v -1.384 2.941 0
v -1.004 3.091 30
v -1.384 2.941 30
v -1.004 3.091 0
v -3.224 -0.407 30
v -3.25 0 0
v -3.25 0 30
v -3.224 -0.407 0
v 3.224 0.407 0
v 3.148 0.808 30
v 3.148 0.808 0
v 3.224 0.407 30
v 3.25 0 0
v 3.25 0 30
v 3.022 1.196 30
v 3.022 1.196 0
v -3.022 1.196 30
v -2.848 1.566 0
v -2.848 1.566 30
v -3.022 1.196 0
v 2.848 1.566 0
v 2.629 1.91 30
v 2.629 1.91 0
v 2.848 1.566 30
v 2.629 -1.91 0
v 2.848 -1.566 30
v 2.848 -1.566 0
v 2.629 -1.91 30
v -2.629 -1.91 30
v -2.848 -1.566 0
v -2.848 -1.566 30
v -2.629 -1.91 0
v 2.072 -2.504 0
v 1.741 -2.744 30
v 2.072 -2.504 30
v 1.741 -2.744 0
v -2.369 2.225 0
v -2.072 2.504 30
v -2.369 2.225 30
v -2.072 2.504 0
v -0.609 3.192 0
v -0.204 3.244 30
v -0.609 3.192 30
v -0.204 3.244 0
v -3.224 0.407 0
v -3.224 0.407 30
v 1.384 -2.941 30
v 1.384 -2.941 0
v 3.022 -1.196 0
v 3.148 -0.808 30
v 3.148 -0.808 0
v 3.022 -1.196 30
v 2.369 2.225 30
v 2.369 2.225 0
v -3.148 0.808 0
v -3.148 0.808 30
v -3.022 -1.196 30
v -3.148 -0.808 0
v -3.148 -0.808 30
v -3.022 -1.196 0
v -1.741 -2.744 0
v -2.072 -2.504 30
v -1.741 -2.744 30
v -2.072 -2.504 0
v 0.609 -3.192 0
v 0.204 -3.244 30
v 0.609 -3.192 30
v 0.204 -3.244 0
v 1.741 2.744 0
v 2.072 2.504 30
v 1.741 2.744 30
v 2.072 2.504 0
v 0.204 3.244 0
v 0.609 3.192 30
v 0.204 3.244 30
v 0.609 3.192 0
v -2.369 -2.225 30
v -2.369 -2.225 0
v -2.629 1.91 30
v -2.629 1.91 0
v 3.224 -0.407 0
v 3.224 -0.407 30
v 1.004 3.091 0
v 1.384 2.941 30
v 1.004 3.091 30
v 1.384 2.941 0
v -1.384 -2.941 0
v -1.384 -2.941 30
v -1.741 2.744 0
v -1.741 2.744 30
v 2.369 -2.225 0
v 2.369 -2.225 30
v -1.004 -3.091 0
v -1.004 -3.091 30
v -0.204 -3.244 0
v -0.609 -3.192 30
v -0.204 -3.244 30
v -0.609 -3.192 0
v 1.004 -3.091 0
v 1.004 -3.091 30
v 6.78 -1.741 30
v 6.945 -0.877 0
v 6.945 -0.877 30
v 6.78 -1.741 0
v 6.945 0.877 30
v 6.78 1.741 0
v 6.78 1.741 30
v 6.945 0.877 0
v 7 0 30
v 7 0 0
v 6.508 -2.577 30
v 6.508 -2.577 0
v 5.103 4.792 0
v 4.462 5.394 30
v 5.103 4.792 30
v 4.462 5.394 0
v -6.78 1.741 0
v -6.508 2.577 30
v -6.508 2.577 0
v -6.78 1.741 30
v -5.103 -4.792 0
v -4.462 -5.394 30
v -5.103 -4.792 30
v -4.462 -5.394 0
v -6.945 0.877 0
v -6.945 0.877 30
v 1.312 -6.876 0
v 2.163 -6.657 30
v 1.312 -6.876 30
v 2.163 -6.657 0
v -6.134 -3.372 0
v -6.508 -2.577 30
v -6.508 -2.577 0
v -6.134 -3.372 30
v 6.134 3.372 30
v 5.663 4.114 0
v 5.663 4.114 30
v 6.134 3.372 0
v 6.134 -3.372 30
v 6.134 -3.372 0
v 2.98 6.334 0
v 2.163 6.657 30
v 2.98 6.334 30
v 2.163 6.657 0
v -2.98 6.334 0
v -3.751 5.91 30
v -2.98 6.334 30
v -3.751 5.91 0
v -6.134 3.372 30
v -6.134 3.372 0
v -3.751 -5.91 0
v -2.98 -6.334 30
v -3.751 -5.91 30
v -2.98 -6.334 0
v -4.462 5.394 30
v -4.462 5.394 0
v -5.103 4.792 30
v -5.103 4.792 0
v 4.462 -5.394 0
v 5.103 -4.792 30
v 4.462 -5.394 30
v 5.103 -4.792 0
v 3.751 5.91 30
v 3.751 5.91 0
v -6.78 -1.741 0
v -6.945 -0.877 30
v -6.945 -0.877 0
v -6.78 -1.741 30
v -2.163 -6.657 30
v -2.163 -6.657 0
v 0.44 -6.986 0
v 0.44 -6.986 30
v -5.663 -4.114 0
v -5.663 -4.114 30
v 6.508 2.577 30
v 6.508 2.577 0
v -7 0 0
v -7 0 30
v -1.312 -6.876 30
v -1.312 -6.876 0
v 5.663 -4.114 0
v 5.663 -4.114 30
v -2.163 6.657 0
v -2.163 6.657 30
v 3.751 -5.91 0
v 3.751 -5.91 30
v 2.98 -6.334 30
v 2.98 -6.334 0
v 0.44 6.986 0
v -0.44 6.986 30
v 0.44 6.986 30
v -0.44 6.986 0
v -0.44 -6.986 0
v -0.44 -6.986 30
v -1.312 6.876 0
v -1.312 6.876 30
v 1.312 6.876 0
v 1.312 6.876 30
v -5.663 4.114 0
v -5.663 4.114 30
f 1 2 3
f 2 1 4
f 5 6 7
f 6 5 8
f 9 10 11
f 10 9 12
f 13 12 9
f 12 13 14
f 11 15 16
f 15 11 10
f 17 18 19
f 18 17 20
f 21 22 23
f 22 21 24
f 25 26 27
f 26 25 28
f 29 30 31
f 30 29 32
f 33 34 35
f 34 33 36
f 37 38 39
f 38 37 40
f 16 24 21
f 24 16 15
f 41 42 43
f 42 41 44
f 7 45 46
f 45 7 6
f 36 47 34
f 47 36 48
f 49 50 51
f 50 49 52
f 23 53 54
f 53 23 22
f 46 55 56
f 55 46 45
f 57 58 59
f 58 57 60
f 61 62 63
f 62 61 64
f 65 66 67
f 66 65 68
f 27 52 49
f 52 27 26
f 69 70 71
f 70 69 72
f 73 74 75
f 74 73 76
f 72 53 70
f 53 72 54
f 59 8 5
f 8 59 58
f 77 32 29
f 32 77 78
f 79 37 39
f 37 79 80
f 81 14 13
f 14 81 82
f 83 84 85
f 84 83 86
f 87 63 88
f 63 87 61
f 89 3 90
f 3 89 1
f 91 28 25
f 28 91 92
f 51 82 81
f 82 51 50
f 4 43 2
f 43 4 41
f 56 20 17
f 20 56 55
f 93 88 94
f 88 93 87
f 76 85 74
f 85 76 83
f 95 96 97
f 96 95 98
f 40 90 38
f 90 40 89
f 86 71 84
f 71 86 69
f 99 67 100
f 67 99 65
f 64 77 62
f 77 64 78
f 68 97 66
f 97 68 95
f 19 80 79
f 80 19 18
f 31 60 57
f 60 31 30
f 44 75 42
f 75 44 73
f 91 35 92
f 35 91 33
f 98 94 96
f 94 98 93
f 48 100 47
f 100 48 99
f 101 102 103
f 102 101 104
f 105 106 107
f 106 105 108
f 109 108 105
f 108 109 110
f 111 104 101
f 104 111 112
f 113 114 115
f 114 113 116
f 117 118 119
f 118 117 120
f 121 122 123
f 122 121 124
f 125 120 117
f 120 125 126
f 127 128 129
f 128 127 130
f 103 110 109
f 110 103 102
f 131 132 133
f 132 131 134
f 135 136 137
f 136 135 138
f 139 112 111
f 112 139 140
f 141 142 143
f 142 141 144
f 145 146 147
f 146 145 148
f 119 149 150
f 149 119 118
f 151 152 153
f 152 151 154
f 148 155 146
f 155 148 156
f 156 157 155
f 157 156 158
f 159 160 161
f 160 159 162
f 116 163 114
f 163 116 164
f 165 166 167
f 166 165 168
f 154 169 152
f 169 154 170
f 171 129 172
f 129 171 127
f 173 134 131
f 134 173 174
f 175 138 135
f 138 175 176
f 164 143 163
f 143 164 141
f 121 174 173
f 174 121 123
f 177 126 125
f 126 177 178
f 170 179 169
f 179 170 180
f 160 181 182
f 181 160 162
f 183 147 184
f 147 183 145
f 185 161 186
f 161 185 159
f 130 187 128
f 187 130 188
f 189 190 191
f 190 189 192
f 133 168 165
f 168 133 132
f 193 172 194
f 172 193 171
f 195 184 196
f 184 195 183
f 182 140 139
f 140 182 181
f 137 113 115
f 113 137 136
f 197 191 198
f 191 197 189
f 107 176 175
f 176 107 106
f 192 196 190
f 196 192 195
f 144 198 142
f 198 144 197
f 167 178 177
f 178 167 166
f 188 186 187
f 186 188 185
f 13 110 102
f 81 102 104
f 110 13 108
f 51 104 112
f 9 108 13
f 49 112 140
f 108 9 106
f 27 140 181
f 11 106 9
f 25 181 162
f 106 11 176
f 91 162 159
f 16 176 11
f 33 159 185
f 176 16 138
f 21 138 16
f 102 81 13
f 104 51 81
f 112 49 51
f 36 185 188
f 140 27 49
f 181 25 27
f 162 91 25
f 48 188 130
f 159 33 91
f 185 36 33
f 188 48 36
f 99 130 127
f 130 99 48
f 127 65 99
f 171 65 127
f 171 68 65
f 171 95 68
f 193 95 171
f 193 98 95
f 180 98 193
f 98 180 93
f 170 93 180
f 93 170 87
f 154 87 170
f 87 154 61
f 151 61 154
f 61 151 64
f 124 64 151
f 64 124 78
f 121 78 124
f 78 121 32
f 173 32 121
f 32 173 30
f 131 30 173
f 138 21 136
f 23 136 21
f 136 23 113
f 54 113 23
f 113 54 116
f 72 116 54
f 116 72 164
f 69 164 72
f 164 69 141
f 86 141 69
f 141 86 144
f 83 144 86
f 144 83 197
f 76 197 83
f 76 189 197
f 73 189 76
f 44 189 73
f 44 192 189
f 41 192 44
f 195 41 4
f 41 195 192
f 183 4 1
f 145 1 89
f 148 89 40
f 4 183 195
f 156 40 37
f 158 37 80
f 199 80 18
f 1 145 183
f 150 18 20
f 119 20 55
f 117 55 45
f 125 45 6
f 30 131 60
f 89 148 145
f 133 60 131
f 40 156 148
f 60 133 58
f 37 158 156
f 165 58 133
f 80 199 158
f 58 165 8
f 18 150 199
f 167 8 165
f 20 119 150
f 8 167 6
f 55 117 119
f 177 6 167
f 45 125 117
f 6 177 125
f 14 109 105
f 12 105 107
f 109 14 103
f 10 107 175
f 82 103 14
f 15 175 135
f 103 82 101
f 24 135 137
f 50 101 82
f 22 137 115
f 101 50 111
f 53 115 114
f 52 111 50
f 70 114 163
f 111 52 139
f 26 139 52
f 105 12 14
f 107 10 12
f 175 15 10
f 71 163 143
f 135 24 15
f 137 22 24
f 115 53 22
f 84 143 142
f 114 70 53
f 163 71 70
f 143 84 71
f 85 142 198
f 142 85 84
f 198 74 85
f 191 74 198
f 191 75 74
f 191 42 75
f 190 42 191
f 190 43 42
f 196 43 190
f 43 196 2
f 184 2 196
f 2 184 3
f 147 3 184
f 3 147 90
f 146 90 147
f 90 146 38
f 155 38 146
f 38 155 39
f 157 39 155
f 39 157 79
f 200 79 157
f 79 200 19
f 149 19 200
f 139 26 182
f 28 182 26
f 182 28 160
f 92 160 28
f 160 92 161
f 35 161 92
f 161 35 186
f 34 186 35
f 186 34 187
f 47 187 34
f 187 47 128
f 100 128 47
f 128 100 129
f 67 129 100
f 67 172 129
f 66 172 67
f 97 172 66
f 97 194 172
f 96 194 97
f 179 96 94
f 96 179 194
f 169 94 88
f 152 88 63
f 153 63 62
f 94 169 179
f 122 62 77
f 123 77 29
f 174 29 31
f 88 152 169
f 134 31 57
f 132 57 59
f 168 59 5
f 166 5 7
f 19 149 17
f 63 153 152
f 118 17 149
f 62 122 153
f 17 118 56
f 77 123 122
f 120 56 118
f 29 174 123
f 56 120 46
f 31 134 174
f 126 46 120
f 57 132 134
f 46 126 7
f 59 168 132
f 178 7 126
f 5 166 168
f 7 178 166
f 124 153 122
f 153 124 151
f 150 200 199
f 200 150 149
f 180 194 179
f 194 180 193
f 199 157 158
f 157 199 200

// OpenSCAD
$fn = 50;


difference() {
	union() {
		*color(alpha = 1.0000000000, c = "gray") {
			translate(v = [0, 7, 0]) {
				linear_extrude(height = 1) {
					text(font = "Arial:style=Bold", halign = "center", size = 4.5000000000, text = "COMMENT plate main", valign = "center");
				}
			}
		}
		cylinder(h = 30, r = 7.0000000000);
	}
	union() {
		*color(alpha = 1.0000000000, c = "gray") {
			translate(v = [0, 7, 0]) {
				linear_extrude(height = 1) {
					text(font = "Arial:style=Bold", halign = "center", size = 4.5000000000, text = "COMMENT holes main", valign = "center");
				}
			}
		}
		translate(v = [0, 0, -100]) {
			cylinder(h = 200, r = 3.2500000000);
		}
		translate(v = [0, 0, -100]) {
			cylinder(h = 200, r = 1.8000000000);
		}
	}
}
